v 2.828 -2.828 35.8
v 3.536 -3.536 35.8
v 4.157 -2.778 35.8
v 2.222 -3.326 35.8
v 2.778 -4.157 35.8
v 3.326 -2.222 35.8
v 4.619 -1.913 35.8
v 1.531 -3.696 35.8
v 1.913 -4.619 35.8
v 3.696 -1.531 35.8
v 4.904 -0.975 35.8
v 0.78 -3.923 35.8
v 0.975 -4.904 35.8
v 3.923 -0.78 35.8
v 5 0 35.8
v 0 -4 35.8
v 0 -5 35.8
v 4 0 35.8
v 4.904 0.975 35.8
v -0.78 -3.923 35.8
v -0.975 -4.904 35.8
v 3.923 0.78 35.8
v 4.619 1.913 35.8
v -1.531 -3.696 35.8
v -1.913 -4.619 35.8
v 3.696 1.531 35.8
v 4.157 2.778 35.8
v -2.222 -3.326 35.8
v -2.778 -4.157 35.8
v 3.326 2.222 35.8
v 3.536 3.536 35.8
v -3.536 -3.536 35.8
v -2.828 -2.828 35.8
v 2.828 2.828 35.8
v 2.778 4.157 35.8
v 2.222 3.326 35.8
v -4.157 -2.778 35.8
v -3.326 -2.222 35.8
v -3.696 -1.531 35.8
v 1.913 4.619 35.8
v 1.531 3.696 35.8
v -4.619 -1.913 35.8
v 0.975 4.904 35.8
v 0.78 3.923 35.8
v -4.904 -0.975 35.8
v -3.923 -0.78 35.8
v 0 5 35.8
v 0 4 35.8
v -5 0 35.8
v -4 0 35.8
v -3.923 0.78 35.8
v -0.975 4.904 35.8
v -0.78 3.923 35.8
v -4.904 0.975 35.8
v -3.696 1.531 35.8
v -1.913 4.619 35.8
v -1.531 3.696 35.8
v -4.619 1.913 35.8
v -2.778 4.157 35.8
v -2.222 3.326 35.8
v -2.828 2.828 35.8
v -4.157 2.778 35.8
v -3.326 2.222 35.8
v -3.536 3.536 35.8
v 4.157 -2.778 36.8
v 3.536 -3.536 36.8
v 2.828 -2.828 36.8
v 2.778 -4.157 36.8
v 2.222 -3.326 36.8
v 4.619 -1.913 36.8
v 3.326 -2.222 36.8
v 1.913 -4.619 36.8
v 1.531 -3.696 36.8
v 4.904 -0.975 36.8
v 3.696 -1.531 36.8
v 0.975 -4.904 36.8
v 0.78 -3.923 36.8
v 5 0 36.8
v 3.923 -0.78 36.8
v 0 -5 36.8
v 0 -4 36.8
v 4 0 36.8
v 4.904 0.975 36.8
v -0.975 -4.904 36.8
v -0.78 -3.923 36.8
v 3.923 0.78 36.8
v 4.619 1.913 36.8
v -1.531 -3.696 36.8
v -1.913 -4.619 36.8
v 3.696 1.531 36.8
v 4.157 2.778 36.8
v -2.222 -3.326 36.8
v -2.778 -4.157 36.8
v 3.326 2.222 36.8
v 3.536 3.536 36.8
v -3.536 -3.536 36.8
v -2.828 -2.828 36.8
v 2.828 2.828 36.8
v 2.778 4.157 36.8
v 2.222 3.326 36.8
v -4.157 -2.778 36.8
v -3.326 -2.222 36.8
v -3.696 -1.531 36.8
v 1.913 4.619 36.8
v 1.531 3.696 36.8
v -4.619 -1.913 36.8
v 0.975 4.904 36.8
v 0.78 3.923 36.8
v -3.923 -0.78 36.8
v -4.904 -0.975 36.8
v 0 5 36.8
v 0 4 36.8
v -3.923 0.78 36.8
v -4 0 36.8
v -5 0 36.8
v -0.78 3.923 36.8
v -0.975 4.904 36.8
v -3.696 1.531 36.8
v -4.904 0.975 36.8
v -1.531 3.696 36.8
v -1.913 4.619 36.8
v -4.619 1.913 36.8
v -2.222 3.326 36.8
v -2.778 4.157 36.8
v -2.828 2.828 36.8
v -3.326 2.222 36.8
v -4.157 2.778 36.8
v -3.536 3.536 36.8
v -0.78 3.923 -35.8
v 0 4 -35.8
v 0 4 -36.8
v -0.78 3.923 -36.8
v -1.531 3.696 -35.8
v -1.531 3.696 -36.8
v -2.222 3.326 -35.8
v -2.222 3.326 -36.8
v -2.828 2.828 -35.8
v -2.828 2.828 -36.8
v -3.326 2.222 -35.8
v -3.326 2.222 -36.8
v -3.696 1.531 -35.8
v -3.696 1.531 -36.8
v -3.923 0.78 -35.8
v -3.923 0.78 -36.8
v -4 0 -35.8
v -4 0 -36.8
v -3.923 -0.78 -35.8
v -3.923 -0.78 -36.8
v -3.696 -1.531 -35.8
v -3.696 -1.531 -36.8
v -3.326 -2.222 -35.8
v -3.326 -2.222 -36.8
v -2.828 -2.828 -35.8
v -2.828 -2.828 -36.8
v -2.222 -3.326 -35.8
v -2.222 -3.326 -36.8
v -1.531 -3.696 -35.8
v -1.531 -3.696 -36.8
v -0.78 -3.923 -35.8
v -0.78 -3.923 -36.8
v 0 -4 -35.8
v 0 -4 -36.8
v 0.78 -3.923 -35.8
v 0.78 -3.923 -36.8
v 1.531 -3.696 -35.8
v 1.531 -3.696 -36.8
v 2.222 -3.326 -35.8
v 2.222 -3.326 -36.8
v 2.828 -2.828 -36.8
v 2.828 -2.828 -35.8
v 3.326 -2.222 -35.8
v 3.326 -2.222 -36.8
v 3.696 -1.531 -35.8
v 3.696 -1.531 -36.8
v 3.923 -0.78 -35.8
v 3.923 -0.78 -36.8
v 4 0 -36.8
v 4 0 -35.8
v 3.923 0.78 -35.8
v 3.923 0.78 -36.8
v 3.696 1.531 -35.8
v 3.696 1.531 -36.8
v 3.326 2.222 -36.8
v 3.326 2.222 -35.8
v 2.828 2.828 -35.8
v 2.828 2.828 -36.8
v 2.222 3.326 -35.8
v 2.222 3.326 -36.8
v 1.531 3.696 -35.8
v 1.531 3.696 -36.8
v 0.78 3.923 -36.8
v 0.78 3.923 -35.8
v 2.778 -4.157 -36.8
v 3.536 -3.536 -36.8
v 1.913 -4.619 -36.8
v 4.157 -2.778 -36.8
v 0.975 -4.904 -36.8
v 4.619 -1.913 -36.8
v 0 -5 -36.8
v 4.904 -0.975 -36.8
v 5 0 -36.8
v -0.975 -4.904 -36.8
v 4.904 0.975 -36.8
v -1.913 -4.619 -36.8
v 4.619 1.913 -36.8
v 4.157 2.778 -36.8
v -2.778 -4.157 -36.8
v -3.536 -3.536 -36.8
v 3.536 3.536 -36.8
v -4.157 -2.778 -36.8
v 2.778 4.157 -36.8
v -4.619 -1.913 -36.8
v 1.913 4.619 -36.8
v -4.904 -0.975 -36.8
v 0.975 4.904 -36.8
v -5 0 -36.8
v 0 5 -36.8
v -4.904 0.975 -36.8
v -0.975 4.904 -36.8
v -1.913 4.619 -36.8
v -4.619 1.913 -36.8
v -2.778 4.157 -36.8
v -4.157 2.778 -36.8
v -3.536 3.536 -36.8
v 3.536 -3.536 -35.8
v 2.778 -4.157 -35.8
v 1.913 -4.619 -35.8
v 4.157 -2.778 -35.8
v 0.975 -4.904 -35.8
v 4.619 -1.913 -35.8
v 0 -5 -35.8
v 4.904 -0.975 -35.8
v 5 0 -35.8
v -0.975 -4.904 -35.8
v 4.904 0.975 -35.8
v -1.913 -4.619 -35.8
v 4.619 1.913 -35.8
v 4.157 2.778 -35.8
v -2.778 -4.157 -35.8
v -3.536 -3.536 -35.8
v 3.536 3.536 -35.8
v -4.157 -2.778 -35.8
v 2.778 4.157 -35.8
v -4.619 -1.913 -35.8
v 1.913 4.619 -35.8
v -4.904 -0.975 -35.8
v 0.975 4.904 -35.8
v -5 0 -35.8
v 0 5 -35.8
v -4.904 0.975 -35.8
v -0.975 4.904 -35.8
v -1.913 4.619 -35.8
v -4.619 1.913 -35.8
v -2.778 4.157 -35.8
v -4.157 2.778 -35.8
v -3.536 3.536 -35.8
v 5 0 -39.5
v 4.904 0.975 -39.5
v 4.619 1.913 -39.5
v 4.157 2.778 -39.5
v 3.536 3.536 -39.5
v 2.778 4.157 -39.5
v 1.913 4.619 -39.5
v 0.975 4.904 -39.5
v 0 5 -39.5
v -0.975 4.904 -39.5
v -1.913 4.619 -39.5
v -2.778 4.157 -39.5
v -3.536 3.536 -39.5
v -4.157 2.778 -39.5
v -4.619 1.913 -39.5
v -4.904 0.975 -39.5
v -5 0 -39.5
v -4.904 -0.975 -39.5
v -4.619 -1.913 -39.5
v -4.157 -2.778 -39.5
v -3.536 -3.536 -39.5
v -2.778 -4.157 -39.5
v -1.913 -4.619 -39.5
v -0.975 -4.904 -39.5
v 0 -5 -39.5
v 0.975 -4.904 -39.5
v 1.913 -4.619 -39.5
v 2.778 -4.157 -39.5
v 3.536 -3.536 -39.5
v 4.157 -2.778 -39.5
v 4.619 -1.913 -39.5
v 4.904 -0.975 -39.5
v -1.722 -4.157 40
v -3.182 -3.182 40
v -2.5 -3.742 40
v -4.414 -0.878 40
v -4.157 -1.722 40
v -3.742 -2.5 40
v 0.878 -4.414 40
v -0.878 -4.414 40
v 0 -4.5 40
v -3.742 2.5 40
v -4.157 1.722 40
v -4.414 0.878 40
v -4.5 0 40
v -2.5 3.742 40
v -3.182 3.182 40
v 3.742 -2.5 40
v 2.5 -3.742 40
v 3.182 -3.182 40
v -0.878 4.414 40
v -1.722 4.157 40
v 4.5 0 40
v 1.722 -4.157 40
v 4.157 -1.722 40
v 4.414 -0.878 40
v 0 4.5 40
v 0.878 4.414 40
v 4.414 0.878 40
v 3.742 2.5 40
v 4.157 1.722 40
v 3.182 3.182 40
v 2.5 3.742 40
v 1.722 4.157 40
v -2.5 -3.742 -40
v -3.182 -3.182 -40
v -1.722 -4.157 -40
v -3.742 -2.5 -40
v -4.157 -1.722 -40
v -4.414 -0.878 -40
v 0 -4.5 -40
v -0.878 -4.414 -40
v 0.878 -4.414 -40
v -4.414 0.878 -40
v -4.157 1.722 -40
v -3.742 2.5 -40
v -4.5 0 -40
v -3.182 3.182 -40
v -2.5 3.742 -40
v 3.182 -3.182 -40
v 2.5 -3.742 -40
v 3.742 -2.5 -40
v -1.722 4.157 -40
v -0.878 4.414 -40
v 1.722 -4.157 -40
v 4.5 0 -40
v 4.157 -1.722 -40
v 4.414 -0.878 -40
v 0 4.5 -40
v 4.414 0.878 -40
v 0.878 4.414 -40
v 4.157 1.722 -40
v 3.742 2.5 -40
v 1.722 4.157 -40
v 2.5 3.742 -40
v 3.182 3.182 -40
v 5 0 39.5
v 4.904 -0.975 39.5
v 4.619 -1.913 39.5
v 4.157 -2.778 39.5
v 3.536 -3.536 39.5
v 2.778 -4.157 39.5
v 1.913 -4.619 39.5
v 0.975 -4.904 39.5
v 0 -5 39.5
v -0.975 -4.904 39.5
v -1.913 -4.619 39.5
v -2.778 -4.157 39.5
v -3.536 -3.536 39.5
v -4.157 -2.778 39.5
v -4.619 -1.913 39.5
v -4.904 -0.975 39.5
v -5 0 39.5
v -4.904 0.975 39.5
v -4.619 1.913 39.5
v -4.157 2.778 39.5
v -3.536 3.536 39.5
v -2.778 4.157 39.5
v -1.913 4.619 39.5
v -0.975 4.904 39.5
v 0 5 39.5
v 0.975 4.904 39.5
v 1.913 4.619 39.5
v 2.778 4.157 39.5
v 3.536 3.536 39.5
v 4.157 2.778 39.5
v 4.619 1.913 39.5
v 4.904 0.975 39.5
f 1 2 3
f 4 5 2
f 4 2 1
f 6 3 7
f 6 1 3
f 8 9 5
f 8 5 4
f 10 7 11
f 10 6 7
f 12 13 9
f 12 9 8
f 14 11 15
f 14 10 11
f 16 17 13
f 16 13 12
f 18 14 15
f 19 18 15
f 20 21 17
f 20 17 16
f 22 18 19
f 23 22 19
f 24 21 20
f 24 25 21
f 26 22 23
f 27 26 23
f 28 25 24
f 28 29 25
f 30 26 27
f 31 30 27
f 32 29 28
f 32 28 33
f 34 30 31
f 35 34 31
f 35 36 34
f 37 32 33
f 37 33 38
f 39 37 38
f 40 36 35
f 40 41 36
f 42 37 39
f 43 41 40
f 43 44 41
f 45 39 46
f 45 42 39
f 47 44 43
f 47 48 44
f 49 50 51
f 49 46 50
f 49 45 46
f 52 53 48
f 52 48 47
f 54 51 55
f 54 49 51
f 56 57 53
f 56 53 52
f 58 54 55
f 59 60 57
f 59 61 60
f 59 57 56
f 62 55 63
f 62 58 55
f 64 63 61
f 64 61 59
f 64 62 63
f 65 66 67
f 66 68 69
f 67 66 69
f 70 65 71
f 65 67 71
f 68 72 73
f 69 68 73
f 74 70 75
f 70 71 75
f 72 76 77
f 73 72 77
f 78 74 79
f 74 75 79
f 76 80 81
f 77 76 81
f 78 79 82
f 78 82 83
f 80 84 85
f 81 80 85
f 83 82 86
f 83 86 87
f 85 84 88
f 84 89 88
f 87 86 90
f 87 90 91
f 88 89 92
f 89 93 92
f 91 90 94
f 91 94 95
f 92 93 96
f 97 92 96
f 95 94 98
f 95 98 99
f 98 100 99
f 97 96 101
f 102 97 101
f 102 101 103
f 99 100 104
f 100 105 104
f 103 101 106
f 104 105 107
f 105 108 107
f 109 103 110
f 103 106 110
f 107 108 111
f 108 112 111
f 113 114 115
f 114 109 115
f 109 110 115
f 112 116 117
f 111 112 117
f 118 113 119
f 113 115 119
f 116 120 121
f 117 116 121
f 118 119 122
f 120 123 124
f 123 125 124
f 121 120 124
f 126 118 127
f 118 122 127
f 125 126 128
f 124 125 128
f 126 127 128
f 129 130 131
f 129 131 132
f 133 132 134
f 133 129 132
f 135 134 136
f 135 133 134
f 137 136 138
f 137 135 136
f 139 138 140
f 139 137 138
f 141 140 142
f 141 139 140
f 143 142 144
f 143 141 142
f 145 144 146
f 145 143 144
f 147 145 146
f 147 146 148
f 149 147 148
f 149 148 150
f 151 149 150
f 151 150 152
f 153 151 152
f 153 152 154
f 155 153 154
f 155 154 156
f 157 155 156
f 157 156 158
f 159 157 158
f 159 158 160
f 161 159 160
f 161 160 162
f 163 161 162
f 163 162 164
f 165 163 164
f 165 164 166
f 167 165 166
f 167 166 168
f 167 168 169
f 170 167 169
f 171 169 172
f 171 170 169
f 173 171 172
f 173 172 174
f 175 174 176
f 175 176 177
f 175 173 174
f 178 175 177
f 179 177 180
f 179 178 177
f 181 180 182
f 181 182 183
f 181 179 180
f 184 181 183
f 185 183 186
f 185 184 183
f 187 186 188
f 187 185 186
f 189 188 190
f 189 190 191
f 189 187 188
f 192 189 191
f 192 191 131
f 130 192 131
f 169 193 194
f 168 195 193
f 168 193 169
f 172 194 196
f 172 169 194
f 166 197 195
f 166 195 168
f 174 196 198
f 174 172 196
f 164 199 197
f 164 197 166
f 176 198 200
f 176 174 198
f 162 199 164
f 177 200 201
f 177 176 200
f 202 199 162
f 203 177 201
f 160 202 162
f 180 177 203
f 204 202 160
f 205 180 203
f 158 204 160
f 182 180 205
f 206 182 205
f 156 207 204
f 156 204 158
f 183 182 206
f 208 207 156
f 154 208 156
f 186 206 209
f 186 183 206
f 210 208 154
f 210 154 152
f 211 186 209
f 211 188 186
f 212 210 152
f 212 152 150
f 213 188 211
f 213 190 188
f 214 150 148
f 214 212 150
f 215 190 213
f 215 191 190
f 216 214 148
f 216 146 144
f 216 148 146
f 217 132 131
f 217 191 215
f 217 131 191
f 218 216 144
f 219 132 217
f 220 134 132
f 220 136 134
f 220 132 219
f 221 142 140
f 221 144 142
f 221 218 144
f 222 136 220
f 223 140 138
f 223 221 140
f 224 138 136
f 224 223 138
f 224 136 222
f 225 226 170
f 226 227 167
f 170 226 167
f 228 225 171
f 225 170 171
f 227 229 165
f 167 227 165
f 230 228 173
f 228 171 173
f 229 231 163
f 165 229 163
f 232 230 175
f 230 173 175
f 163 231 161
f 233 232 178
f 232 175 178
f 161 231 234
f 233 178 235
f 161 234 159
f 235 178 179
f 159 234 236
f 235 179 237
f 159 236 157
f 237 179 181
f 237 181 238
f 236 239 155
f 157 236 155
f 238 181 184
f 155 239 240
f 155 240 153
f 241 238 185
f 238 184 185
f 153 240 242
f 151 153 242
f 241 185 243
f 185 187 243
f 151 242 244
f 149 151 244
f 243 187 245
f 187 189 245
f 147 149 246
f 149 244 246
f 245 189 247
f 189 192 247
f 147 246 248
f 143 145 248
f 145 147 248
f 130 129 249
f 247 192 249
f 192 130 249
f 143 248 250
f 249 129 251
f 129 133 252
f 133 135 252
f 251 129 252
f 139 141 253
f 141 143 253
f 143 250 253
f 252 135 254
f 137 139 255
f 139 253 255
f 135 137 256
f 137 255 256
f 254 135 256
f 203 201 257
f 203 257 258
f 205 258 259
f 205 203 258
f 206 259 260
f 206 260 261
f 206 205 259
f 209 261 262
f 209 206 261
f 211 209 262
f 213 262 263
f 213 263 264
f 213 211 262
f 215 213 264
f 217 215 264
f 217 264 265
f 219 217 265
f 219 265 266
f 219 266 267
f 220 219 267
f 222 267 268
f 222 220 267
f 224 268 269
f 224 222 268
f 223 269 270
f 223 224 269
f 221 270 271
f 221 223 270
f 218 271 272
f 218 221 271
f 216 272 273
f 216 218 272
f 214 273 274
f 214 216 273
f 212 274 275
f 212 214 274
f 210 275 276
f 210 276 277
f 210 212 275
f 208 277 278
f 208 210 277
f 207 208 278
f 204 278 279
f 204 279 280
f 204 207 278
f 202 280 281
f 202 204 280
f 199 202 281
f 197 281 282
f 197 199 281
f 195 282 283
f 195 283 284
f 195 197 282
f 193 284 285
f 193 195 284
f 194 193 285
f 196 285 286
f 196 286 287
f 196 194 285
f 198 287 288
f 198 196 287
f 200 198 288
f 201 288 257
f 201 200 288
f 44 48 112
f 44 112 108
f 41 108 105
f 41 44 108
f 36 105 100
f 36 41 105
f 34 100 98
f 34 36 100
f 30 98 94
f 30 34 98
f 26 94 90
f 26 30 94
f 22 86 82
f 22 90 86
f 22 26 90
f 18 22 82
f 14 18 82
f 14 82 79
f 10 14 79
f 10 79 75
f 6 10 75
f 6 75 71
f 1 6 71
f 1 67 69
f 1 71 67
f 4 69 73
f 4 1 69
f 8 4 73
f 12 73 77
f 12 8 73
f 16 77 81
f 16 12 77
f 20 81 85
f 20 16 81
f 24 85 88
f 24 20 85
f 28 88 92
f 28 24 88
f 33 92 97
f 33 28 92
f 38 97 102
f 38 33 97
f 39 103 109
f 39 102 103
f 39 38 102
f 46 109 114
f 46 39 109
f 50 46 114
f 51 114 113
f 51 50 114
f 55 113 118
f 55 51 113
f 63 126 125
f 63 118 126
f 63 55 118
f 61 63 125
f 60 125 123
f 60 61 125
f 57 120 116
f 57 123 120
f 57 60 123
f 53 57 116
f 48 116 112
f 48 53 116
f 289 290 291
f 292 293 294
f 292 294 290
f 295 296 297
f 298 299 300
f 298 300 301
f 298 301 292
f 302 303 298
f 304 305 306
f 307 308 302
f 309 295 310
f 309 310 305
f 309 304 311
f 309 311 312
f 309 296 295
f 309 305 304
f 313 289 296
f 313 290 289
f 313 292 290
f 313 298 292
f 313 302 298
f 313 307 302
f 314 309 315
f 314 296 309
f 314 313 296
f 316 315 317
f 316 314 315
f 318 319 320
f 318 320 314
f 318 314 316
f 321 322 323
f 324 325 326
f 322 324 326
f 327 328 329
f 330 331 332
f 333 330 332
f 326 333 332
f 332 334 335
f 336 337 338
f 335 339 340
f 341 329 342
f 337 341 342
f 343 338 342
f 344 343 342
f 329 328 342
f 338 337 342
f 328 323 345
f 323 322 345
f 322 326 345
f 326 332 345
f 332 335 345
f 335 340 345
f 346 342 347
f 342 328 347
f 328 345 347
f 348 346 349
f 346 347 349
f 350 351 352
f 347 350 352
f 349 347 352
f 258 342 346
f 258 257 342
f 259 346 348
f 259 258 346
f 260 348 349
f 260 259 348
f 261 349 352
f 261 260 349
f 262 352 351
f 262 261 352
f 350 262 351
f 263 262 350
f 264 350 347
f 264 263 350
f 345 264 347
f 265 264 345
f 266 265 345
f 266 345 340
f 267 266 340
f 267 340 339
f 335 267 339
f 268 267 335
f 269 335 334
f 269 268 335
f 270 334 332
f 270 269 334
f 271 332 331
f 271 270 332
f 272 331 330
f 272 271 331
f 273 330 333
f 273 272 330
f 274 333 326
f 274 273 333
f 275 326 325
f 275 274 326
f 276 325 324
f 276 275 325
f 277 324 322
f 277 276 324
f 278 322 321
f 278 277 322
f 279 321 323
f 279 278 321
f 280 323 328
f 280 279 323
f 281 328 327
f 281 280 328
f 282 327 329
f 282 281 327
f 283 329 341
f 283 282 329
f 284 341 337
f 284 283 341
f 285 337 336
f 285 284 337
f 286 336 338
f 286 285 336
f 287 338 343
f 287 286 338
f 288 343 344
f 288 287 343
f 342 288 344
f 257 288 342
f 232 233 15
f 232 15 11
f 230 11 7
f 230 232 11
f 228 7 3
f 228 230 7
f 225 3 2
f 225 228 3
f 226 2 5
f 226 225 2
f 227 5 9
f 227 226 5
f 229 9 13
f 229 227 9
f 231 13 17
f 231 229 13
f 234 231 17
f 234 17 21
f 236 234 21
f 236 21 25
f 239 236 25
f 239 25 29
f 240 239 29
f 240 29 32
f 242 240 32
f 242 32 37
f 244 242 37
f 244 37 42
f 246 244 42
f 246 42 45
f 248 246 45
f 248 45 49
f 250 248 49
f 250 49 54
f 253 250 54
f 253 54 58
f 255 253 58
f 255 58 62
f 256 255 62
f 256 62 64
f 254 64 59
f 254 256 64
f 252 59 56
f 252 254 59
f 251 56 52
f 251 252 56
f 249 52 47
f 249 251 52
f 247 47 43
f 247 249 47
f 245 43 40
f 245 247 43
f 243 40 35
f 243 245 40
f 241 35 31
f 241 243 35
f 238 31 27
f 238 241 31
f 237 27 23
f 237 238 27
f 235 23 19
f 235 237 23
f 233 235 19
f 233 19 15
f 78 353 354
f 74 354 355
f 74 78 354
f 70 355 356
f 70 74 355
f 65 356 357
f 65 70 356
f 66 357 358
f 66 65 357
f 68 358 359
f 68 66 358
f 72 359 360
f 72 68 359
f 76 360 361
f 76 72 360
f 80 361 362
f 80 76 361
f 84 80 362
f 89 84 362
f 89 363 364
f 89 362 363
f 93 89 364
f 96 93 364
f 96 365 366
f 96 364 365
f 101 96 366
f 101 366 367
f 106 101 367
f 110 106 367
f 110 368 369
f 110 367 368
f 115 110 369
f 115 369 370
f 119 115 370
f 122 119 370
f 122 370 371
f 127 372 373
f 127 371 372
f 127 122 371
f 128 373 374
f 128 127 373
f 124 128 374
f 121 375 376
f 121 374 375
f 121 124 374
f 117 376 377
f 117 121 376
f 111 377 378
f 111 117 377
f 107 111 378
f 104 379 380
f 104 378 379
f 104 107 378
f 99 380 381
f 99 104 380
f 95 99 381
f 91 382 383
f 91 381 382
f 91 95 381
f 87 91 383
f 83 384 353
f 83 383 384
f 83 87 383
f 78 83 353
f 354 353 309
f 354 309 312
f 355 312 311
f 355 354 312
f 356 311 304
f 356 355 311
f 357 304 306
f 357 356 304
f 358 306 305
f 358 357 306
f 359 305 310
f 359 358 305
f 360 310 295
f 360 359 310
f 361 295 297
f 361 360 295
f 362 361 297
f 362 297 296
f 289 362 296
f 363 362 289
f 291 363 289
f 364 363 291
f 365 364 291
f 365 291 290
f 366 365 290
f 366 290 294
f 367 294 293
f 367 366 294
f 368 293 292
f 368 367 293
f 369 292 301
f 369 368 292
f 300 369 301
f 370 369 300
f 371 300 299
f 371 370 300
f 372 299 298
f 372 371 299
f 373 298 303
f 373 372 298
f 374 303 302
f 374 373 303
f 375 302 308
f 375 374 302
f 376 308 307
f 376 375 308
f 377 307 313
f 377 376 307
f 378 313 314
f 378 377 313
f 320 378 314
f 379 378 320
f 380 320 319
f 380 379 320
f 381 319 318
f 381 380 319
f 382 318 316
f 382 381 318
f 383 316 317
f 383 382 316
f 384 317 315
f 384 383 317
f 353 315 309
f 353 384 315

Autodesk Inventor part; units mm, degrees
ref_plane "YZ Plane" through (0, 0, 0) normal (1, 0, 0) x (0, 1, 0)
ref_plane "XZ Plane" through (0, 0, 0) normal (0, 1, 0) x (-1, 0, 0)
ref_plane "XY Plane" through (0, 0, 0) normal (0, 0, 1) x (1, 0, 0)
sketch "Esboço1" plane through (0, 0, 0) normal (0, 0, 1) x (1, 0, 0)
  circle A0 centre (0, 0) radius 5
  dimension "d0" = 10
extrude "Extrusão1" add sketch "Esboço1" along normal mid plane 80
sketch "Esboço2" plane through (0, 0, 0) normal (1, 0, 0) x (0, 1, 0)
  line L0 (5, -40) -> (5, 40) projected
  line L1 (5, 36.8) -> (4, 36.8)
  line L2 (4, 36.8) -> (4, 35.8)
  line L3 (4, 35.8) -> (5, 35.8)
  line L4 (5, 35.8) -> (5, 36.8)
  line L5 (4, -35.8) -> (5, -35.8)
  line L6 (5, -35.8) -> (5, -36.8)
  line L7 (5, -36.8) -> (4, -36.8)
  line L8 (4, -36.8) -> (4, -35.8)
  line L9 (5, 40) -> (-5, 40) projected
  line L10 (-5, -40) -> (5, -40) projected
  line L11 (0, -56) -> (0, 56) projected
  point P0 (0, 0)
  dimension "d3" = 4.2
  dimension "d4" = 1
  dimension "d5" = 4
  dimension "d6" = 1
  dimension "d7" = 4.2
revolve "Revolução1" cut sketch "Esboço2" angle 360 about axis through (0, 0, -10) along (0, 0, 1) contours L7 L8 L5 L0 | L3 L2 L1 L0
chamfer "Chanfro1" distance 0.5 angle 45 2 edges at (-5, 0, 40) (-5, 0, -40)
